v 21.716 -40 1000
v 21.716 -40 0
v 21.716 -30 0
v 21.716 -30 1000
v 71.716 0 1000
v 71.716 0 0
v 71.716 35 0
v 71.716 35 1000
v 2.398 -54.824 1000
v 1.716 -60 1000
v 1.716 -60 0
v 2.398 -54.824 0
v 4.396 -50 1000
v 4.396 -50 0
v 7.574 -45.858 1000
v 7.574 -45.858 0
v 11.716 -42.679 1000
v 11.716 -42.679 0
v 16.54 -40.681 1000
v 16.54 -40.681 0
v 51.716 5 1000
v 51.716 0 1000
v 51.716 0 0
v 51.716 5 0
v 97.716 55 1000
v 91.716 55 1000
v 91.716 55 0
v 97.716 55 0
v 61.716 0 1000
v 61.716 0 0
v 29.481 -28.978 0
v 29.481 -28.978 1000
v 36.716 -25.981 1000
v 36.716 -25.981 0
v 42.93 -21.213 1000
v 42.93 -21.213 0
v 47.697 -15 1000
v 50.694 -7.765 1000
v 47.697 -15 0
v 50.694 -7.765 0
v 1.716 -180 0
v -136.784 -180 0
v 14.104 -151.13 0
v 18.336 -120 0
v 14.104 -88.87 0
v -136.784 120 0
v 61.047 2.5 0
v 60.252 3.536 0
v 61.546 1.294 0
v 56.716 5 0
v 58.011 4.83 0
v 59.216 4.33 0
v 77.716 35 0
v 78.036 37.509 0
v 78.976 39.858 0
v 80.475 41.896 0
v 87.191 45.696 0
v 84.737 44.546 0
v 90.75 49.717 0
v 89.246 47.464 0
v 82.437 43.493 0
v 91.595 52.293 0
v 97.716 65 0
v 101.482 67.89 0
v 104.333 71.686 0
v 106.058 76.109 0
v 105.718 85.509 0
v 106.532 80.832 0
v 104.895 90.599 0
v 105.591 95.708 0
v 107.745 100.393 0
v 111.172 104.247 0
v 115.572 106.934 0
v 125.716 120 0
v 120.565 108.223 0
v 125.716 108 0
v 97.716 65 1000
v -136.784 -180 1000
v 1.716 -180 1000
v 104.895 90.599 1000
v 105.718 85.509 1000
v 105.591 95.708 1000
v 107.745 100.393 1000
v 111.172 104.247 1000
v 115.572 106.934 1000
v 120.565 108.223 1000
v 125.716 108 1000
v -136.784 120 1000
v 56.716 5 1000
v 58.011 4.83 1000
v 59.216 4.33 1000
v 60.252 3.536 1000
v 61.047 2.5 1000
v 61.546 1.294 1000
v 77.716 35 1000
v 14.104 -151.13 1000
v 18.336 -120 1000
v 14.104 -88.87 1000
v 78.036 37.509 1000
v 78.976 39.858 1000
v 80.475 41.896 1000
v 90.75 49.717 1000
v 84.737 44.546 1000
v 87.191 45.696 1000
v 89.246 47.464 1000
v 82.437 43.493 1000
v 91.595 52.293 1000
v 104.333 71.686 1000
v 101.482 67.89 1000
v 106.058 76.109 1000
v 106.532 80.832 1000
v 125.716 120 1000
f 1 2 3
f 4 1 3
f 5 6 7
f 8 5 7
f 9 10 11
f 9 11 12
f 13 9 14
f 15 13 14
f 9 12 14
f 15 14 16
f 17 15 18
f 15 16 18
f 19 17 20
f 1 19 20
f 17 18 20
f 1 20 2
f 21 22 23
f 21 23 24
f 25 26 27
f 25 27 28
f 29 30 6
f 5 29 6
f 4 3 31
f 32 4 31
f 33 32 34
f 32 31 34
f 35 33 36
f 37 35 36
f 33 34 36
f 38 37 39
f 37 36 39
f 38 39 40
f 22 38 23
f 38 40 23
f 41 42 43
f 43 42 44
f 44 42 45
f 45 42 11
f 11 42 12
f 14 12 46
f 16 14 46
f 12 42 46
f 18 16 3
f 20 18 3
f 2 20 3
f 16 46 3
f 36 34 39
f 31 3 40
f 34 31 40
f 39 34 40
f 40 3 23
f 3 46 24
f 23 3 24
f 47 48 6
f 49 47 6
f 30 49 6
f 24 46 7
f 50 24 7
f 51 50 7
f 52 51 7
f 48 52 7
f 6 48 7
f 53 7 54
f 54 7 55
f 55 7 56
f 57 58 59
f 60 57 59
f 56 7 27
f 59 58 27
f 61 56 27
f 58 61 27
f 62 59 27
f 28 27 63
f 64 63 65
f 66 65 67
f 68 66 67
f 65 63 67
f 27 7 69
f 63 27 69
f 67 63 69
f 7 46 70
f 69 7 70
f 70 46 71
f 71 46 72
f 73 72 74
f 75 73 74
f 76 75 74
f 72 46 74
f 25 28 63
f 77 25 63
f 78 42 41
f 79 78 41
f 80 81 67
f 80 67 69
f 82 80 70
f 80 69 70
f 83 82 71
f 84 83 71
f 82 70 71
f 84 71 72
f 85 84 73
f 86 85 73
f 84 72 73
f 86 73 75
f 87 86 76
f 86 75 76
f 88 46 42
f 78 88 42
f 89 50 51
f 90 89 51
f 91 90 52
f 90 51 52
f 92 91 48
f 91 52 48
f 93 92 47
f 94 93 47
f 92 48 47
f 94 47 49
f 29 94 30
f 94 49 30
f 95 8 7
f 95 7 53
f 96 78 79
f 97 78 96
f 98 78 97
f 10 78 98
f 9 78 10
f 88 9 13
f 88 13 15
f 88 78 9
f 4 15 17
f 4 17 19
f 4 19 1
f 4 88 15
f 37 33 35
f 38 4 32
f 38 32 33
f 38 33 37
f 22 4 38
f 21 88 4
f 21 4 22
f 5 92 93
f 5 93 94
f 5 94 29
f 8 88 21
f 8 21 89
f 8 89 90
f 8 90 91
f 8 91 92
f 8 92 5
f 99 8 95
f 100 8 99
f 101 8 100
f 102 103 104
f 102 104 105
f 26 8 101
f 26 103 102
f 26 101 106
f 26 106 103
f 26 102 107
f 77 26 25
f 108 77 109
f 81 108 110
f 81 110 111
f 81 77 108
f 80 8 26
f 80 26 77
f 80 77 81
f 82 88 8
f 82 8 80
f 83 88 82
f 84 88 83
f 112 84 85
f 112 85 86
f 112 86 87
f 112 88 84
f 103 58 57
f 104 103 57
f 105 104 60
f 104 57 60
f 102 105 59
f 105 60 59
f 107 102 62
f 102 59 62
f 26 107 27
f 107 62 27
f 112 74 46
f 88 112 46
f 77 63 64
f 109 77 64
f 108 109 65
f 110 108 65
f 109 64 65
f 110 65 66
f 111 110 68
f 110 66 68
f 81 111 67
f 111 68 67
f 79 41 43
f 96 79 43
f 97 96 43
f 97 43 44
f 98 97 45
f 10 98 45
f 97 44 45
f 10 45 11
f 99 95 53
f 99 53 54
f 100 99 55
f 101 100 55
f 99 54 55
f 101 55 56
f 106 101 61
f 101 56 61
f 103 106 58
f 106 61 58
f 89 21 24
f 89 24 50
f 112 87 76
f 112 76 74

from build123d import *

# Parameters (mm, degrees)
F1_DEPTH = 1000


with BuildPart() as f1:
    # F0 (on Top) → F1 (new body)
    with BuildSketch(Plane.XY):
        with BuildLine():
            Line((125.716477, 120), (-136.783523, 120))
            Line((-136.783523, 120), (-136.783523, -180))
            Line((-136.783523, -180), (1.716477, -180))
            ThreePointArc((1.716477, -180), (18.335515, -120), (1.716477, -60))
            ThreePointArc((1.716477, -60), (7.574341, -45.857864), (21.716477, -40))
            Line((21.716477, -40), (21.716477, -30))
            ThreePointArc((21.716477, -30), (42.92968, -21.213203), (51.716477, 0))
            Line((51.716477, 0), (51.716477, 5))
            Line((51.716477, 5), (56.716477, 5))
            ThreePointArc((56.716477, 5), (60.252011, 3.535534), (61.716477, 0))
            Line((61.716477, 0), (71.716477, 0))
            Line((71.716477, 0), (71.716477, 35))
            Line((71.716477, 35), (77.716477, 35))
            ThreePointArc((77.716477, 35), (79.66063, 40.924807), (84.737143, 44.545867))
            ThreePointArc((84.737143, 44.545867), (90.074672, 48.539274), (91.716477, 55))
            Line((91.716477, 55), (97.716477, 55))
            Line((97.716477, 55), (97.716477, 65))
            ThreePointArc((97.716477, 65), (105.346334, 73.838605), (105.718453, 85.508959))
            ThreePointArc((105.718453, 85.508959), (109.315655, 102.446682), (125.716477, 108))
            Line((125.716477, 108), (125.716477, 120))
        make_face()
    extrude(amount=F1_DEPTH)


solid = f1.part
